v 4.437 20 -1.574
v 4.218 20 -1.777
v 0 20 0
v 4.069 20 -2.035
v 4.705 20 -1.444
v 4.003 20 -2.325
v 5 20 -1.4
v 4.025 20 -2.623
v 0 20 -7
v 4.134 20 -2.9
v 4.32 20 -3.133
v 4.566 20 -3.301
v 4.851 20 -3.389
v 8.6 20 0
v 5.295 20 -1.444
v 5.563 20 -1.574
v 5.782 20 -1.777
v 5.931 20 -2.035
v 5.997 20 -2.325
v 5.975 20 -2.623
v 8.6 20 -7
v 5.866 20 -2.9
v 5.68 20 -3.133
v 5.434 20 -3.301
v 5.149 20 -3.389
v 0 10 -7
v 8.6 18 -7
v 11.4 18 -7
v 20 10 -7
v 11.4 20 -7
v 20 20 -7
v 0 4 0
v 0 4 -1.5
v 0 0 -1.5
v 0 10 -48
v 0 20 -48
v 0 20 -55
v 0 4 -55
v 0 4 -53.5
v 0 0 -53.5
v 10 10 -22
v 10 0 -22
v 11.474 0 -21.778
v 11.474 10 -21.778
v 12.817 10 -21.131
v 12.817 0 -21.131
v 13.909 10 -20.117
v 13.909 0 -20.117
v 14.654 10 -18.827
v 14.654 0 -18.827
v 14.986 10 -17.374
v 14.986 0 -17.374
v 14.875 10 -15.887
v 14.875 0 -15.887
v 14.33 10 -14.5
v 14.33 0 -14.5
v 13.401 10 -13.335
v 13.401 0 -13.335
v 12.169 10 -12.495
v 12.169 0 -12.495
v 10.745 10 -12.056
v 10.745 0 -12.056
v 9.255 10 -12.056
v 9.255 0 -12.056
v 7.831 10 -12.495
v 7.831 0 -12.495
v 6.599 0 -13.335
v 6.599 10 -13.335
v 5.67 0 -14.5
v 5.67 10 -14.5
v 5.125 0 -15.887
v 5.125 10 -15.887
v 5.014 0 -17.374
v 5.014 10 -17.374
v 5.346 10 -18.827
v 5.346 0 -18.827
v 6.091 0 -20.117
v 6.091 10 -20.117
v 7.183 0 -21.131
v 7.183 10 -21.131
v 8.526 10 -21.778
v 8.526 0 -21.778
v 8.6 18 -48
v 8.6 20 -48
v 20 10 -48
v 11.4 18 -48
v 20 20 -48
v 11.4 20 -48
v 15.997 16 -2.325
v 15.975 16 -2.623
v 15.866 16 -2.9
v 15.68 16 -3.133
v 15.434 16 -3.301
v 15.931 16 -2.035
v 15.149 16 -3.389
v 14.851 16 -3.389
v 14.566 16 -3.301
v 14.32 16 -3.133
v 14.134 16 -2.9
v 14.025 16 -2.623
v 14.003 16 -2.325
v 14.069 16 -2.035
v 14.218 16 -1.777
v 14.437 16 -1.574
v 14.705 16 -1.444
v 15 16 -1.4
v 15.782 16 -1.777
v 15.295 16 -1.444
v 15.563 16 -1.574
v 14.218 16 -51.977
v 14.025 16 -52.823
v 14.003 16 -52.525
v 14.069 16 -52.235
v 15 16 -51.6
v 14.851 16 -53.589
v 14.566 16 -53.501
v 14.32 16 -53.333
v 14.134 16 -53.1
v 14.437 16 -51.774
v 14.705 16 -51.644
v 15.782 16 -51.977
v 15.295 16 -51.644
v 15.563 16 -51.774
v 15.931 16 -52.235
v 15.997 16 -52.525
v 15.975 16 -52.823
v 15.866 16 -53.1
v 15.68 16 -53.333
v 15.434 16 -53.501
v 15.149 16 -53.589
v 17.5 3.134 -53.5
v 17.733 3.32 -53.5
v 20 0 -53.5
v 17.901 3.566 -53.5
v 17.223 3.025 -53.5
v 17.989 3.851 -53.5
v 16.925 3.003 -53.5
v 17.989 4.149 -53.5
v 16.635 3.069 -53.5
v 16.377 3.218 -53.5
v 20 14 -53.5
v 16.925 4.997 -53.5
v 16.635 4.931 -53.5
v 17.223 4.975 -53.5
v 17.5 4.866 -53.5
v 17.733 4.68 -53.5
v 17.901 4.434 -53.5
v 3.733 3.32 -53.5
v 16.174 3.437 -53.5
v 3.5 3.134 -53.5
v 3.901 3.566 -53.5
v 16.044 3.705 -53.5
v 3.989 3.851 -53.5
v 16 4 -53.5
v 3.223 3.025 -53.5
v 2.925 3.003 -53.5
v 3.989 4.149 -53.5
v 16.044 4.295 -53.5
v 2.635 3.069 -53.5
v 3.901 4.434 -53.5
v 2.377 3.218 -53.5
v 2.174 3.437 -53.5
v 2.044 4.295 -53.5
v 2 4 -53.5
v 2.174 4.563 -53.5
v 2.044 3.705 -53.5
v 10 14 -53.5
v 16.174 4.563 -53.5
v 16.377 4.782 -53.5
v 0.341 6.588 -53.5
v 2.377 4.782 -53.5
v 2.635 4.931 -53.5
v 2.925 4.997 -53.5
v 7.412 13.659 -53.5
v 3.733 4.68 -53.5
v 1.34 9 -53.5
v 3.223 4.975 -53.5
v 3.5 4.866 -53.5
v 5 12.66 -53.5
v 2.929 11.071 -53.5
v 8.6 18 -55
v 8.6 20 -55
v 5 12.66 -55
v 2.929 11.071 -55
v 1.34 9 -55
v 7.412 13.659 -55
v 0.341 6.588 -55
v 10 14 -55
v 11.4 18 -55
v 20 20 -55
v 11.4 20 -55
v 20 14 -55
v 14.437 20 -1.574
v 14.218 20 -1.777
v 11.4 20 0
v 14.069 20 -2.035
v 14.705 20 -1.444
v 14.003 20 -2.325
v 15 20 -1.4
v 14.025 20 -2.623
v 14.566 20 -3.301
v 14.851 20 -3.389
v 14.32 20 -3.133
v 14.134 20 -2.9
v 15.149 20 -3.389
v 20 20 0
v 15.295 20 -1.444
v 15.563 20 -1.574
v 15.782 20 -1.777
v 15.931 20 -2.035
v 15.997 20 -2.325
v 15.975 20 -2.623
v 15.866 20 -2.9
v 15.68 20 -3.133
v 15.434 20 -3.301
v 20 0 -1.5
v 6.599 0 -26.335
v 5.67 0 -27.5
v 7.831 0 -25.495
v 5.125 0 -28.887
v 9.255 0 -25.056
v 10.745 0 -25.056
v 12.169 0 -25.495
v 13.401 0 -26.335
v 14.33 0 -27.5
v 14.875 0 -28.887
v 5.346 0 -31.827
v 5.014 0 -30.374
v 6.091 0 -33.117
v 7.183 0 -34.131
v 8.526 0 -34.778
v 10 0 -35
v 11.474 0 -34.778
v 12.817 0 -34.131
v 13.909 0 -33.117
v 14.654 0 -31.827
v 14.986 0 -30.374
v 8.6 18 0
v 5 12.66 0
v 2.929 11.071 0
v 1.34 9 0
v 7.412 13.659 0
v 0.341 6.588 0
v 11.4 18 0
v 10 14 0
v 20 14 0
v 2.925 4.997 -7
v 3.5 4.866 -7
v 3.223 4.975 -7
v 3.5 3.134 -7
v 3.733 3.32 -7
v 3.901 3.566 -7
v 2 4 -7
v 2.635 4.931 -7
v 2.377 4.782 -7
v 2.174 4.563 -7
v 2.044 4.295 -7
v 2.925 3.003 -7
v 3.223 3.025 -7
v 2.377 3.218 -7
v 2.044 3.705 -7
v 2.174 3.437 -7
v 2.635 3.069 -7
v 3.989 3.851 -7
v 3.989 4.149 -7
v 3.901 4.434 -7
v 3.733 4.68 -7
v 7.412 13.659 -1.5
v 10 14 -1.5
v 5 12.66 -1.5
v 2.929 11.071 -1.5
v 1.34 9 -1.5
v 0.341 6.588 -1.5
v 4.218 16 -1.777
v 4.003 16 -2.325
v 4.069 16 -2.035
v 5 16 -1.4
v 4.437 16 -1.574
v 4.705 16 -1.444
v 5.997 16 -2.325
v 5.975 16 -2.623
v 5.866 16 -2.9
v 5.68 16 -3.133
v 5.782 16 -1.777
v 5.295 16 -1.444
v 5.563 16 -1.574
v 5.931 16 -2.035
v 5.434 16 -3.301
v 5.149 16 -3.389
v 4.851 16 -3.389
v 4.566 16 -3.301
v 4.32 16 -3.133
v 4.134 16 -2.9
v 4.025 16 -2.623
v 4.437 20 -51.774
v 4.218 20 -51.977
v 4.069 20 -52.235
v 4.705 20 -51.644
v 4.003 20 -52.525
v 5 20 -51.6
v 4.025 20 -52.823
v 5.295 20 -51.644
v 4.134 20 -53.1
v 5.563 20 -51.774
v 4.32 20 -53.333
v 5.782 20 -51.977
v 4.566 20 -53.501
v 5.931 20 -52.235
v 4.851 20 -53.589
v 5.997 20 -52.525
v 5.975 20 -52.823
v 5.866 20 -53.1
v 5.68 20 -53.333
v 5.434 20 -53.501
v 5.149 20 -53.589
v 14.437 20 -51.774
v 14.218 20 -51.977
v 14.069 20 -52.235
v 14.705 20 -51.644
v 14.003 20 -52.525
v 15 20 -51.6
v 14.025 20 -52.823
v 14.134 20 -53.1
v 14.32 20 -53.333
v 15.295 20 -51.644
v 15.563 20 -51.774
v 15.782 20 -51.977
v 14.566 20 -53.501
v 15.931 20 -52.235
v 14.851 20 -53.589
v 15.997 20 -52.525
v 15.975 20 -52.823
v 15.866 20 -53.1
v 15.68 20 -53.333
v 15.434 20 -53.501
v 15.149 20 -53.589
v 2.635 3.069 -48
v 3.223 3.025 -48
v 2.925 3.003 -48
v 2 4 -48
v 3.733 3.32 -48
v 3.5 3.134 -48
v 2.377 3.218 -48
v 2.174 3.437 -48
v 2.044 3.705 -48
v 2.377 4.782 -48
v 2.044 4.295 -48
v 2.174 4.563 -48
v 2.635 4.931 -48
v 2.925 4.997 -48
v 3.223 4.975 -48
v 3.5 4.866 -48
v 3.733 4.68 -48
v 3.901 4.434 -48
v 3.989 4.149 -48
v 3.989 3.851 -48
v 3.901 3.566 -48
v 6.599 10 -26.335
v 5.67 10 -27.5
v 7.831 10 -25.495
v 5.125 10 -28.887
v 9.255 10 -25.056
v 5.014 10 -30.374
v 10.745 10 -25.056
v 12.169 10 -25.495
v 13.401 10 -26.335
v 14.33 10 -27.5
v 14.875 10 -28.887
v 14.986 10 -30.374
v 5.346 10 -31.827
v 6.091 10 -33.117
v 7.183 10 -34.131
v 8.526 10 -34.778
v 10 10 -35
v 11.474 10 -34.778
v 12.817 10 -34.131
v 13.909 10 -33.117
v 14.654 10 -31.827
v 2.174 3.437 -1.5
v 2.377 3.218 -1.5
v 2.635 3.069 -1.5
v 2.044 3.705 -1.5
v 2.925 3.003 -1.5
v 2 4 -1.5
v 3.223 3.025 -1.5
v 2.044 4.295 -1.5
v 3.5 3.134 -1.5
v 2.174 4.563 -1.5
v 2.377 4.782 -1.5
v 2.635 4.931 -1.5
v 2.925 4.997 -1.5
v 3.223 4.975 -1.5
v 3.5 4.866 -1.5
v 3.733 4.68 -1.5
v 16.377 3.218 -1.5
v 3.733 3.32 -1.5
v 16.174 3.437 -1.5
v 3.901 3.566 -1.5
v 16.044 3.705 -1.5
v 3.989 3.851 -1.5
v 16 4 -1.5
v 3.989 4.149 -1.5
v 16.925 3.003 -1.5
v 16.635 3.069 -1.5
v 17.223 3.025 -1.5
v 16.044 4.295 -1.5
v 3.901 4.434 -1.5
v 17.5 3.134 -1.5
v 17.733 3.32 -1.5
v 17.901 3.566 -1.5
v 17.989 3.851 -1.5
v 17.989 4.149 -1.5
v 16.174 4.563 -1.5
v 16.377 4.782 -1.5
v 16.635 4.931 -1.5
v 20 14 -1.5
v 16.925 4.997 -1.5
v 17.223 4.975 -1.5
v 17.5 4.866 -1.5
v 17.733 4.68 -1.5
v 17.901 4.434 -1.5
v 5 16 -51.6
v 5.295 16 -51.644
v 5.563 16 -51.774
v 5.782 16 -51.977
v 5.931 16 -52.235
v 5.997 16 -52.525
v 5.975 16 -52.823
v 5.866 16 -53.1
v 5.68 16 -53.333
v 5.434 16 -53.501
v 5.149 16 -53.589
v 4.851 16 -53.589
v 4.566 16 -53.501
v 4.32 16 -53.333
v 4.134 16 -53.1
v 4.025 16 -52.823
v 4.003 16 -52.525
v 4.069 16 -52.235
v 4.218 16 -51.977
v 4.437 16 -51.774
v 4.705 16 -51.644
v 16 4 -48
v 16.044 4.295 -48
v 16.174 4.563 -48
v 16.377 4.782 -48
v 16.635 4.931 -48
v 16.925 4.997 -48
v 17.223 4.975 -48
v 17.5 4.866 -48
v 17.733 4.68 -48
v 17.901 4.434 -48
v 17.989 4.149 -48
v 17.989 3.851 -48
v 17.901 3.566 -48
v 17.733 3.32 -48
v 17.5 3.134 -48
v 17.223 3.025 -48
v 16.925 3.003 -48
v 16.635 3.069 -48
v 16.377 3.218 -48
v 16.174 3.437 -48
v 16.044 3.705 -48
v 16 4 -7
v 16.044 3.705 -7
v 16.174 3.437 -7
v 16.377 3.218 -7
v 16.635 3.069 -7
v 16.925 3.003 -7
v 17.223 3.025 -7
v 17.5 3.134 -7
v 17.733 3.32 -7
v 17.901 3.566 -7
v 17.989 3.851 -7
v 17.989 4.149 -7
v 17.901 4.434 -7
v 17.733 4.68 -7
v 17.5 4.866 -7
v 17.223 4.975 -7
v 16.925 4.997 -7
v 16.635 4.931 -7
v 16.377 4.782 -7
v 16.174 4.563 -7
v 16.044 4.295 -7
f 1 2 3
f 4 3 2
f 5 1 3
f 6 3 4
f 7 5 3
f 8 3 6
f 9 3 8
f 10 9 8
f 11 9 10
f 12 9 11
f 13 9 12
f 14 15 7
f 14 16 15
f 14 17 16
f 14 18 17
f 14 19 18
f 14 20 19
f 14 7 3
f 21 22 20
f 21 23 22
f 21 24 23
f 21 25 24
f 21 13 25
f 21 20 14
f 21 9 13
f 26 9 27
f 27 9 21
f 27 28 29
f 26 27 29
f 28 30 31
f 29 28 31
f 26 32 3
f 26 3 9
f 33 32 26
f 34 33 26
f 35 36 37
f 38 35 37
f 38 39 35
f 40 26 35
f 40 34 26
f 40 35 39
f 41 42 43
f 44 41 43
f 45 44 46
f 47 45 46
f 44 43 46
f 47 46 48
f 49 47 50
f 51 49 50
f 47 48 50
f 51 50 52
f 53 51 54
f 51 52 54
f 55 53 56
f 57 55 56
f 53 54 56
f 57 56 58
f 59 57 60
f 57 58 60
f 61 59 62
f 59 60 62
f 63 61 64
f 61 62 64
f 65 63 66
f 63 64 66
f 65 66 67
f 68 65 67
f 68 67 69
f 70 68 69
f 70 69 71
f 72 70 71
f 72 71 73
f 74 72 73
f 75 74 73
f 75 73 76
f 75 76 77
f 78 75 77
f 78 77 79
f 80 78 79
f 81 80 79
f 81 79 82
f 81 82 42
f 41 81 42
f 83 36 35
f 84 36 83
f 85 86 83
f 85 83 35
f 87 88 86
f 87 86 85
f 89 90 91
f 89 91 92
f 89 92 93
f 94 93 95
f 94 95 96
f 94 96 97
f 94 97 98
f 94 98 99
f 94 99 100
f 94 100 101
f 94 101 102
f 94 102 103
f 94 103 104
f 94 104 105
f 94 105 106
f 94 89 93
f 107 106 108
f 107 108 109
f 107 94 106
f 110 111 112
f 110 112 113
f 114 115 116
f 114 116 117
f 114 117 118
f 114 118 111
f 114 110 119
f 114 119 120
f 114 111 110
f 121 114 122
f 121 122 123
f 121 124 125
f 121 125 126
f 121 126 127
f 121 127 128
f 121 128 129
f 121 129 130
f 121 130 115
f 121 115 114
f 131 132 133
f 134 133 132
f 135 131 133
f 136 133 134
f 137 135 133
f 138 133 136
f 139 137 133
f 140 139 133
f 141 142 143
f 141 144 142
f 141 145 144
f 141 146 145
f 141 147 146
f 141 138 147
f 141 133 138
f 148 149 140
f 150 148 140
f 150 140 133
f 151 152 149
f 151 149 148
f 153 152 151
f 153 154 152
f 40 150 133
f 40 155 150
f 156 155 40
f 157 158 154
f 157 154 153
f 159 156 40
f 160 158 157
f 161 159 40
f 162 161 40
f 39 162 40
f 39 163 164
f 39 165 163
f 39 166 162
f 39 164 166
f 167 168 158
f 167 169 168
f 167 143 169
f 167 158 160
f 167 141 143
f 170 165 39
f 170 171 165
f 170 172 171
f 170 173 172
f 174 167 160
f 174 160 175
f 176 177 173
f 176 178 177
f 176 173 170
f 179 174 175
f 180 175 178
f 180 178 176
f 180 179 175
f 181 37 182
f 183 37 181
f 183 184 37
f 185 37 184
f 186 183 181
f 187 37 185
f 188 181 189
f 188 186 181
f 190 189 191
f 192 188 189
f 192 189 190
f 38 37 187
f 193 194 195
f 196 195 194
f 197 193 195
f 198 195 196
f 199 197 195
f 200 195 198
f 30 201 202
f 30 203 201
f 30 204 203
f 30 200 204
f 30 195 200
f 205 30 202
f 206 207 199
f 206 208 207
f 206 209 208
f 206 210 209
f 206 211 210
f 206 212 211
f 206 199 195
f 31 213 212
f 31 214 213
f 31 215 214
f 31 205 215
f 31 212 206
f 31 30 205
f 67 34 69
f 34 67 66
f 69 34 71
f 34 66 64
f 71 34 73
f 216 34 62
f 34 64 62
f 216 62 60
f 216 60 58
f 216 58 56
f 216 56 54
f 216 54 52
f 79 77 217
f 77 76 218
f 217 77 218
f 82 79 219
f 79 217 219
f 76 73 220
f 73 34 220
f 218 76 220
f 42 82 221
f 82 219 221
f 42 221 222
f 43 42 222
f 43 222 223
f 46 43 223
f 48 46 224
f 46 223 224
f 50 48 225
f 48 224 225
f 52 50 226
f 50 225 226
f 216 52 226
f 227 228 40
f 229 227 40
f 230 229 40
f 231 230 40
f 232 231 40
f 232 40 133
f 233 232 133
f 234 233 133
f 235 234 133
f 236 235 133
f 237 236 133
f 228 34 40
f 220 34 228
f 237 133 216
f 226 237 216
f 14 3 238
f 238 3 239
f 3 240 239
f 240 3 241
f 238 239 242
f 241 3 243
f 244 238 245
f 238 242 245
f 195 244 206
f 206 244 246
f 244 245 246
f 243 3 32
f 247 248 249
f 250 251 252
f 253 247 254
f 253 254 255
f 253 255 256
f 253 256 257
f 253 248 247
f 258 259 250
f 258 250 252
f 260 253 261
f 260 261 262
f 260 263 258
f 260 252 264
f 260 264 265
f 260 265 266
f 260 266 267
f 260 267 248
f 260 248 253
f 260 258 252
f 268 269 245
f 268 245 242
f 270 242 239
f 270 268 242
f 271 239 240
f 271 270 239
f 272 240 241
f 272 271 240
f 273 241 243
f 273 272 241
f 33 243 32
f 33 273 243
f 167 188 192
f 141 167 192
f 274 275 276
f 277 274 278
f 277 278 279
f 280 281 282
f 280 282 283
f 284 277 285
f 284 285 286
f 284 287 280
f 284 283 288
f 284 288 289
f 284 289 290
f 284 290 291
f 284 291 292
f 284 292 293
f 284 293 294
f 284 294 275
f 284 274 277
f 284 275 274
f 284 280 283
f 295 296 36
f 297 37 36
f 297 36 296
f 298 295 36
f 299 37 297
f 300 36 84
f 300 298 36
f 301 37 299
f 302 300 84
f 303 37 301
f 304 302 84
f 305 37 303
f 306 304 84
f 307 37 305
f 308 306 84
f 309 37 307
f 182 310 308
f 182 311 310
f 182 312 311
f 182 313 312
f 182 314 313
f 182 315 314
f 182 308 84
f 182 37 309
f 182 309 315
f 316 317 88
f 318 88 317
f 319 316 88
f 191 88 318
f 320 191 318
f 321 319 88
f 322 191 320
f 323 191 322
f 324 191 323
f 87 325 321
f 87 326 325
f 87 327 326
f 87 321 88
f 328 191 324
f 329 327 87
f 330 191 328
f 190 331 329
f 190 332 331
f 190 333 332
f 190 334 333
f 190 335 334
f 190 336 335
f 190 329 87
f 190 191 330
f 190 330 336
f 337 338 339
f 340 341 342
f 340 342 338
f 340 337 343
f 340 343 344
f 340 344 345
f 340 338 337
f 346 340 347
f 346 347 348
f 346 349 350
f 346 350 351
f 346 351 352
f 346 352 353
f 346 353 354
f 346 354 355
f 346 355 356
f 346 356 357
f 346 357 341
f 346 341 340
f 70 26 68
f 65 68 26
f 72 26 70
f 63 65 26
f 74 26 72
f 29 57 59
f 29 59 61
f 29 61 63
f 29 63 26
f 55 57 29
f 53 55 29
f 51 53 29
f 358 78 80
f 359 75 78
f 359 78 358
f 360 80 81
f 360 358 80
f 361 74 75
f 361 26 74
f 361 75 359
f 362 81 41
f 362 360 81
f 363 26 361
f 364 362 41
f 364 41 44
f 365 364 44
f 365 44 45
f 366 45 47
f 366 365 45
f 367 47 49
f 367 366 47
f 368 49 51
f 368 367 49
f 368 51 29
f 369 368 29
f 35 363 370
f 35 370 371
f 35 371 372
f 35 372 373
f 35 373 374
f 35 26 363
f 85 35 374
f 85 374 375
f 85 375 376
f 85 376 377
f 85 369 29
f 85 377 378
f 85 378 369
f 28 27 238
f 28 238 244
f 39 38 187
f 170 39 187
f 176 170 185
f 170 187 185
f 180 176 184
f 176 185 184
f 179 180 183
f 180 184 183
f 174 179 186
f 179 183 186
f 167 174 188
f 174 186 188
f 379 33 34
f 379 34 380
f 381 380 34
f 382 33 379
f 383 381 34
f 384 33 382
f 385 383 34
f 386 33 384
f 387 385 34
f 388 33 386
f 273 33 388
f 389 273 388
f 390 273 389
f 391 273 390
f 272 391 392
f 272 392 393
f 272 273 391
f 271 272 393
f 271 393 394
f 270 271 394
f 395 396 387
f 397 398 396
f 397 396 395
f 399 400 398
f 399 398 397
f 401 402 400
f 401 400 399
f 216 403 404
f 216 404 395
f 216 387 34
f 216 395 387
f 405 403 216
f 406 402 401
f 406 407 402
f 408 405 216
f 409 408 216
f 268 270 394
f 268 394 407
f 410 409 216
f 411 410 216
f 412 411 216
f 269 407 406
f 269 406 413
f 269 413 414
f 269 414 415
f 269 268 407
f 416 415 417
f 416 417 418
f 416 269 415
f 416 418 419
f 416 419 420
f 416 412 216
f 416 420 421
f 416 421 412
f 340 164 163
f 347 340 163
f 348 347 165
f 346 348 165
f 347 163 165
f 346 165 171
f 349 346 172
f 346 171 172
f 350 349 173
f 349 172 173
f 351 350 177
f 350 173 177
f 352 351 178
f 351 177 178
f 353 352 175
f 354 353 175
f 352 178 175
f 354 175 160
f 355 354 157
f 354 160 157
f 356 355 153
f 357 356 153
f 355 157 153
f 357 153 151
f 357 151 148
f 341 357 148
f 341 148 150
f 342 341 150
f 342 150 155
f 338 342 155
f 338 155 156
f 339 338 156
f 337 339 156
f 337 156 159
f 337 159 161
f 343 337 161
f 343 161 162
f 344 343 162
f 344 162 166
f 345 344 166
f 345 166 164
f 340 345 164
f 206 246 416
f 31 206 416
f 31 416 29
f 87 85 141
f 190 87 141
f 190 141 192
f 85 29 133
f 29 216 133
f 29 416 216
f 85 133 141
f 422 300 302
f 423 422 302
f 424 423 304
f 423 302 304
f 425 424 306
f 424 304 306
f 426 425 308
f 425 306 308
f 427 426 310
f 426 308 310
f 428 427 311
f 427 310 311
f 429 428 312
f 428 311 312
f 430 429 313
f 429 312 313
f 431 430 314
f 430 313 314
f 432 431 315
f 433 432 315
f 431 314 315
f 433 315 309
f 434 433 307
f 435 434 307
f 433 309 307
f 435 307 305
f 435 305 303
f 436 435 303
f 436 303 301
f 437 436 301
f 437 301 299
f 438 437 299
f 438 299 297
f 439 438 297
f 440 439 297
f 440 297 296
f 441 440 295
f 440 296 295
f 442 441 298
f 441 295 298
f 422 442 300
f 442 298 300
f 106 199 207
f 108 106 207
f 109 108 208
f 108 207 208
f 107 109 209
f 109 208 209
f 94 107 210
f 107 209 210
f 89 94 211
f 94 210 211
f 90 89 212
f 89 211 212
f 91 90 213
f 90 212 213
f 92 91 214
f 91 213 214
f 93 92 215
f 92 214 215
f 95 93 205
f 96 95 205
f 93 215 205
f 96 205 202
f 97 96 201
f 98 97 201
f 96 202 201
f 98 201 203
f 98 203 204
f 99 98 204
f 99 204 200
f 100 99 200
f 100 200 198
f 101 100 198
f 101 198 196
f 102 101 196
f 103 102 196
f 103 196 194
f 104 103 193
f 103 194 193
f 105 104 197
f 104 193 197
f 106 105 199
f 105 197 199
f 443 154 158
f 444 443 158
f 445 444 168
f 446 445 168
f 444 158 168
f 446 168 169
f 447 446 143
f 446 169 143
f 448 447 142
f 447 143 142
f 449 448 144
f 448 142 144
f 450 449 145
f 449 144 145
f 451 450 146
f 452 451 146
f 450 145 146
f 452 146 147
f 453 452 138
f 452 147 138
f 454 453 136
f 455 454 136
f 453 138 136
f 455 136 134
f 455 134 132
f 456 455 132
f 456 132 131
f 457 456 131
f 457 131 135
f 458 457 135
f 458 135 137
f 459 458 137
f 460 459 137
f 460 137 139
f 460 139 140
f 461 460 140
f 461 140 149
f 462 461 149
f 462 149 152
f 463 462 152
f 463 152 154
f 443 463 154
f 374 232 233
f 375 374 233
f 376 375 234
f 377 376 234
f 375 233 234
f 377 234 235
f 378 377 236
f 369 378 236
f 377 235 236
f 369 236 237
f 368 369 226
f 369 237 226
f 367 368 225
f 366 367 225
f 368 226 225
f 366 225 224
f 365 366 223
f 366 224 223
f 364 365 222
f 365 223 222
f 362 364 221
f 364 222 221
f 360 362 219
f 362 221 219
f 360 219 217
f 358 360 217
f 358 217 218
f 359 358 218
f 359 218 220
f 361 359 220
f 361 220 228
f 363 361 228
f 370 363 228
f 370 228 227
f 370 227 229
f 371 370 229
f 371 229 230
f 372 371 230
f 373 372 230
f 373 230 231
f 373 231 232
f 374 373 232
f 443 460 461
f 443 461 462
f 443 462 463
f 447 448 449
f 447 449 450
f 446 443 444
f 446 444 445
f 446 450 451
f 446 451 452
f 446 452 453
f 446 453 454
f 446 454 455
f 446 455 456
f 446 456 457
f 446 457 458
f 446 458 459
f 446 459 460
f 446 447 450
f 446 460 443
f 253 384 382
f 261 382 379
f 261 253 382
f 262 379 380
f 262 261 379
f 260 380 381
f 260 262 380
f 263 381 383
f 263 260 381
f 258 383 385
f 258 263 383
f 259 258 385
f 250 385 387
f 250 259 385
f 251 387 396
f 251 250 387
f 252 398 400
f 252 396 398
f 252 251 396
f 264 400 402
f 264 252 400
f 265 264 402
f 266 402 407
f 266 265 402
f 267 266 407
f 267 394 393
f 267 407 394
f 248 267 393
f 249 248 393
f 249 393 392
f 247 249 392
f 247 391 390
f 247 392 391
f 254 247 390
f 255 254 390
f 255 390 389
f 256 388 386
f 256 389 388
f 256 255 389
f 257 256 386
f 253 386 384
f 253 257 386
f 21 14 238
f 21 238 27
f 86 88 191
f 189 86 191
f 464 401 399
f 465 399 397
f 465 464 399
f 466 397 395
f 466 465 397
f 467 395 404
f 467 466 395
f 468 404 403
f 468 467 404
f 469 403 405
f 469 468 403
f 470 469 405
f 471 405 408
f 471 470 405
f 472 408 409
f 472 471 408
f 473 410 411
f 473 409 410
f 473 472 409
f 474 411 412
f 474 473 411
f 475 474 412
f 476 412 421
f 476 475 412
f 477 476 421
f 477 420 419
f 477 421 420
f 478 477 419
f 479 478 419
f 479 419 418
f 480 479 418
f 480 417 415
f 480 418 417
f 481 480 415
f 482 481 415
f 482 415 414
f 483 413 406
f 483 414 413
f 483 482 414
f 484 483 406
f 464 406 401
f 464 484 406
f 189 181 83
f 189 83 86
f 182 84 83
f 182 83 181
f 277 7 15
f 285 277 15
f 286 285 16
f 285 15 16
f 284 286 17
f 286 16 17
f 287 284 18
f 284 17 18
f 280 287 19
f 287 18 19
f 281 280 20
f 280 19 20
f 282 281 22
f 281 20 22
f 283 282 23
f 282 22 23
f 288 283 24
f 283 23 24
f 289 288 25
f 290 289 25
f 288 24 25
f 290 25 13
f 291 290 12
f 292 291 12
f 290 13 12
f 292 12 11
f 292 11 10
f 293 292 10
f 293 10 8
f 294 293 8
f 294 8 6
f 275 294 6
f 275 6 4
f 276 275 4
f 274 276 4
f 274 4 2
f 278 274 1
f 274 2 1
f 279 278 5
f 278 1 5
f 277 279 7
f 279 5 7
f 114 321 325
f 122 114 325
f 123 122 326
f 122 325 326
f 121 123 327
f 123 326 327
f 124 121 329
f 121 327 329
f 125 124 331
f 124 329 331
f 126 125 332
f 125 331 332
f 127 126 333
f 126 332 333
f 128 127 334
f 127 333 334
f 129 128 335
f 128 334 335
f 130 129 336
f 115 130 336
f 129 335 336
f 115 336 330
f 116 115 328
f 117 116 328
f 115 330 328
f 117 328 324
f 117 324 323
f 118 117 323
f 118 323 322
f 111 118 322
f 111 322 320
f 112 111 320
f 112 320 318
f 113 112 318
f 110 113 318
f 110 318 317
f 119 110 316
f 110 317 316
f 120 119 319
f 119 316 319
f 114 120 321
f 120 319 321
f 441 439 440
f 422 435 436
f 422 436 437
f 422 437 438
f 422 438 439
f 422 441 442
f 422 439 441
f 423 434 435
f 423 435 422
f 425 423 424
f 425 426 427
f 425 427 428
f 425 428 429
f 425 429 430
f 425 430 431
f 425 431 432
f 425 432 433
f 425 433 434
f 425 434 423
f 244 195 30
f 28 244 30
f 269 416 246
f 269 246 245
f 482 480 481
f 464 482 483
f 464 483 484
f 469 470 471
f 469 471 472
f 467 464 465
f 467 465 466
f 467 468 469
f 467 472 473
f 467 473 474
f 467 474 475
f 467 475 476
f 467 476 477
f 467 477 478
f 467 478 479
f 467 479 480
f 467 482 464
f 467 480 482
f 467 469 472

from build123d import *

# Parameters (mm, degrees)
SKETCH_1_W          = 20
SKETCH_1_H          = 55
EXTRUDE_1_DEPTH     = 20
SKETCH_2_W          = 20
SKETCH_2_H          = 41
CUT_EXTRUDE_1_DEPTH = 10
SKETCH_3_W          = 2.8
SKETCH_3_H          = 55
CUT_EXTRUDE_2_DEPTH = 2
SKETCH_4_R          = 1
CUT_EXTRUDE_3_DEPTH = 4
SKETCH_5_R          = 5
CUT_EXTRUDE_4_DEPTH = 62.846584384
SKETCH_6_R          = 1
CUT_EXTRUDE_5_DEPTH = 7
CUT_EXTRUDE_START   = -7
SKETCH_7_R          = 1
CUT_EXTRUDE_6_DEPTH = 7
CUT_EXTRUDE_7_DEPTH = 1.5
CUT_EXTRUDE_START_2 = -1.5
CUT_EXTRUDE_8_DEPTH = 1.5


with BuildPart() as part:
    # Эскиз1 → Бобышка-Вытянуть1 (new body)
    with BuildSketch(Plane(origin=(0, 0, 0), x_dir=(1, 0, 0), z_dir=(0, 1, 0))):
        with Locations((10, 27.5)):
            Rectangle(SKETCH_1_W, SKETCH_1_H)
    extrude(amount=EXTRUDE_1_DEPTH)

    # Эскиз2 → Вырез-Вытянуть1 (cut)
    with BuildSketch(Plane(origin=(0, 20, 0), x_dir=(1, 0, 0), z_dir=(0, 1, 0))):
        with Locations((10, 27.5)):
            Rectangle(SKETCH_2_W, SKETCH_2_H)
    extrude(amount=-CUT_EXTRUDE_1_DEPTH, mode=Mode.SUBTRACT)

    # Эскиз3 → Вырез-Вытянуть2 (cut)
    with BuildSketch(Plane(origin=(0, 20, 0), x_dir=(1, 0, 0), z_dir=(0, 1, 0))):
        with Locations((10, 27.5)):
            Rectangle(SKETCH_3_W, SKETCH_3_H)
    extrude(amount=-CUT_EXTRUDE_2_DEPTH, mode=Mode.SUBTRACT)

    # Эскиз4 → Вырез-Вытянуть3 (cut)
    with BuildSketch(Plane(origin=(0, 20, 0), x_dir=(1, 0, 0), z_dir=(0, 1, 0))):
        with Locations(Location((15, 52.6, 0), (0, 0, 270))):
            Circle(SKETCH_4_R)
        with Locations(Location((5, 52.6, 0), (0, 0, 270))):
            Circle(SKETCH_4_R)
        with Locations(Location((15, 2.4, 0), (0, 0, 270))):
            Circle(SKETCH_4_R)
        with Locations(Location((5, 2.4, 0), (0, 0, 270))):
            Circle(SKETCH_4_R)
    extrude(amount=-CUT_EXTRUDE_3_DEPTH, mode=Mode.SUBTRACT)

    # Эскиз5 → Вырез-Вытянуть4 (cut, through all)
    with BuildSketch(Plane.XZ):
        with Locations(Location((10, -17, 0), (0, 0, 270))):
            Circle(SKETCH_5_R)
        with Locations(Location((10, -30, 0), (0, 0, 270))):
            Circle(SKETCH_5_R)
    extrude(amount=-CUT_EXTRUDE_4_DEPTH, mode=Mode.SUBTRACT)

    # Эскиз6 → Вырез-Вытянуть5 (cut)
    with BuildSketch(Plane(origin=(0, 0, -55), x_dir=(-1, 0, 0), z_dir=(0, 0, -1))):
        with Locations((-17, 4)):
            Circle(SKETCH_6_R)
        with Locations((-3, 4)):
            Circle(SKETCH_6_R)
    extrude(amount=-CUT_EXTRUDE_5_DEPTH, mode=Mode.SUBTRACT)

    # Эскиз7 → Вырез-Вытянуть6 (cut)
    with BuildSketch(Plane.XY.offset(CUT_EXTRUDE_START)):
        with Locations(Location((3, 4, 0), (0, 0, 180))):
            Circle(SKETCH_7_R)
        with Locations(Location((17, 4, 0), (0, 0, 180))):
            Circle(SKETCH_7_R)
    extrude(amount=CUT_EXTRUDE_6_DEPTH, mode=Mode.SUBTRACT)

    # Эскиз8 → Вырез-Вытянуть7 (cut)
    with BuildSketch(Plane(origin=(0, 0, -55), x_dir=(-1, 0, 0), z_dir=(0, 0, -1))):
        with BuildLine():
            Line((-10, 14), (-20, 14))
            Line((-20, 14), (-20, 0))
            Line((-20, 0), (0, 0))
            Line((0, 0), (0, 4))
            ThreePointArc((0, 4), (-2.928932188, 11.071067812), (-10, 14))
        make_face()
    extrude(amount=-CUT_EXTRUDE_7_DEPTH, mode=Mode.SUBTRACT)

    # Эскиз9 → Вырез-Вытянуть8 (cut)
    with BuildSketch(Plane.XY.offset(CUT_EXTRUDE_START_2)):
        with BuildLine():
            Line((0, 4), (0, 0))
            Line((0, 0), (20, 0))
            Line((20, 0), (20, 14))
            Line((20, 14), (10, 14))
            ThreePointArc((10, 14), (2.928932188, 11.071067812), (0, 4))
        make_face()
    extrude(amount=CUT_EXTRUDE_8_DEPTH, mode=Mode.SUBTRACT)


solid = part.part
